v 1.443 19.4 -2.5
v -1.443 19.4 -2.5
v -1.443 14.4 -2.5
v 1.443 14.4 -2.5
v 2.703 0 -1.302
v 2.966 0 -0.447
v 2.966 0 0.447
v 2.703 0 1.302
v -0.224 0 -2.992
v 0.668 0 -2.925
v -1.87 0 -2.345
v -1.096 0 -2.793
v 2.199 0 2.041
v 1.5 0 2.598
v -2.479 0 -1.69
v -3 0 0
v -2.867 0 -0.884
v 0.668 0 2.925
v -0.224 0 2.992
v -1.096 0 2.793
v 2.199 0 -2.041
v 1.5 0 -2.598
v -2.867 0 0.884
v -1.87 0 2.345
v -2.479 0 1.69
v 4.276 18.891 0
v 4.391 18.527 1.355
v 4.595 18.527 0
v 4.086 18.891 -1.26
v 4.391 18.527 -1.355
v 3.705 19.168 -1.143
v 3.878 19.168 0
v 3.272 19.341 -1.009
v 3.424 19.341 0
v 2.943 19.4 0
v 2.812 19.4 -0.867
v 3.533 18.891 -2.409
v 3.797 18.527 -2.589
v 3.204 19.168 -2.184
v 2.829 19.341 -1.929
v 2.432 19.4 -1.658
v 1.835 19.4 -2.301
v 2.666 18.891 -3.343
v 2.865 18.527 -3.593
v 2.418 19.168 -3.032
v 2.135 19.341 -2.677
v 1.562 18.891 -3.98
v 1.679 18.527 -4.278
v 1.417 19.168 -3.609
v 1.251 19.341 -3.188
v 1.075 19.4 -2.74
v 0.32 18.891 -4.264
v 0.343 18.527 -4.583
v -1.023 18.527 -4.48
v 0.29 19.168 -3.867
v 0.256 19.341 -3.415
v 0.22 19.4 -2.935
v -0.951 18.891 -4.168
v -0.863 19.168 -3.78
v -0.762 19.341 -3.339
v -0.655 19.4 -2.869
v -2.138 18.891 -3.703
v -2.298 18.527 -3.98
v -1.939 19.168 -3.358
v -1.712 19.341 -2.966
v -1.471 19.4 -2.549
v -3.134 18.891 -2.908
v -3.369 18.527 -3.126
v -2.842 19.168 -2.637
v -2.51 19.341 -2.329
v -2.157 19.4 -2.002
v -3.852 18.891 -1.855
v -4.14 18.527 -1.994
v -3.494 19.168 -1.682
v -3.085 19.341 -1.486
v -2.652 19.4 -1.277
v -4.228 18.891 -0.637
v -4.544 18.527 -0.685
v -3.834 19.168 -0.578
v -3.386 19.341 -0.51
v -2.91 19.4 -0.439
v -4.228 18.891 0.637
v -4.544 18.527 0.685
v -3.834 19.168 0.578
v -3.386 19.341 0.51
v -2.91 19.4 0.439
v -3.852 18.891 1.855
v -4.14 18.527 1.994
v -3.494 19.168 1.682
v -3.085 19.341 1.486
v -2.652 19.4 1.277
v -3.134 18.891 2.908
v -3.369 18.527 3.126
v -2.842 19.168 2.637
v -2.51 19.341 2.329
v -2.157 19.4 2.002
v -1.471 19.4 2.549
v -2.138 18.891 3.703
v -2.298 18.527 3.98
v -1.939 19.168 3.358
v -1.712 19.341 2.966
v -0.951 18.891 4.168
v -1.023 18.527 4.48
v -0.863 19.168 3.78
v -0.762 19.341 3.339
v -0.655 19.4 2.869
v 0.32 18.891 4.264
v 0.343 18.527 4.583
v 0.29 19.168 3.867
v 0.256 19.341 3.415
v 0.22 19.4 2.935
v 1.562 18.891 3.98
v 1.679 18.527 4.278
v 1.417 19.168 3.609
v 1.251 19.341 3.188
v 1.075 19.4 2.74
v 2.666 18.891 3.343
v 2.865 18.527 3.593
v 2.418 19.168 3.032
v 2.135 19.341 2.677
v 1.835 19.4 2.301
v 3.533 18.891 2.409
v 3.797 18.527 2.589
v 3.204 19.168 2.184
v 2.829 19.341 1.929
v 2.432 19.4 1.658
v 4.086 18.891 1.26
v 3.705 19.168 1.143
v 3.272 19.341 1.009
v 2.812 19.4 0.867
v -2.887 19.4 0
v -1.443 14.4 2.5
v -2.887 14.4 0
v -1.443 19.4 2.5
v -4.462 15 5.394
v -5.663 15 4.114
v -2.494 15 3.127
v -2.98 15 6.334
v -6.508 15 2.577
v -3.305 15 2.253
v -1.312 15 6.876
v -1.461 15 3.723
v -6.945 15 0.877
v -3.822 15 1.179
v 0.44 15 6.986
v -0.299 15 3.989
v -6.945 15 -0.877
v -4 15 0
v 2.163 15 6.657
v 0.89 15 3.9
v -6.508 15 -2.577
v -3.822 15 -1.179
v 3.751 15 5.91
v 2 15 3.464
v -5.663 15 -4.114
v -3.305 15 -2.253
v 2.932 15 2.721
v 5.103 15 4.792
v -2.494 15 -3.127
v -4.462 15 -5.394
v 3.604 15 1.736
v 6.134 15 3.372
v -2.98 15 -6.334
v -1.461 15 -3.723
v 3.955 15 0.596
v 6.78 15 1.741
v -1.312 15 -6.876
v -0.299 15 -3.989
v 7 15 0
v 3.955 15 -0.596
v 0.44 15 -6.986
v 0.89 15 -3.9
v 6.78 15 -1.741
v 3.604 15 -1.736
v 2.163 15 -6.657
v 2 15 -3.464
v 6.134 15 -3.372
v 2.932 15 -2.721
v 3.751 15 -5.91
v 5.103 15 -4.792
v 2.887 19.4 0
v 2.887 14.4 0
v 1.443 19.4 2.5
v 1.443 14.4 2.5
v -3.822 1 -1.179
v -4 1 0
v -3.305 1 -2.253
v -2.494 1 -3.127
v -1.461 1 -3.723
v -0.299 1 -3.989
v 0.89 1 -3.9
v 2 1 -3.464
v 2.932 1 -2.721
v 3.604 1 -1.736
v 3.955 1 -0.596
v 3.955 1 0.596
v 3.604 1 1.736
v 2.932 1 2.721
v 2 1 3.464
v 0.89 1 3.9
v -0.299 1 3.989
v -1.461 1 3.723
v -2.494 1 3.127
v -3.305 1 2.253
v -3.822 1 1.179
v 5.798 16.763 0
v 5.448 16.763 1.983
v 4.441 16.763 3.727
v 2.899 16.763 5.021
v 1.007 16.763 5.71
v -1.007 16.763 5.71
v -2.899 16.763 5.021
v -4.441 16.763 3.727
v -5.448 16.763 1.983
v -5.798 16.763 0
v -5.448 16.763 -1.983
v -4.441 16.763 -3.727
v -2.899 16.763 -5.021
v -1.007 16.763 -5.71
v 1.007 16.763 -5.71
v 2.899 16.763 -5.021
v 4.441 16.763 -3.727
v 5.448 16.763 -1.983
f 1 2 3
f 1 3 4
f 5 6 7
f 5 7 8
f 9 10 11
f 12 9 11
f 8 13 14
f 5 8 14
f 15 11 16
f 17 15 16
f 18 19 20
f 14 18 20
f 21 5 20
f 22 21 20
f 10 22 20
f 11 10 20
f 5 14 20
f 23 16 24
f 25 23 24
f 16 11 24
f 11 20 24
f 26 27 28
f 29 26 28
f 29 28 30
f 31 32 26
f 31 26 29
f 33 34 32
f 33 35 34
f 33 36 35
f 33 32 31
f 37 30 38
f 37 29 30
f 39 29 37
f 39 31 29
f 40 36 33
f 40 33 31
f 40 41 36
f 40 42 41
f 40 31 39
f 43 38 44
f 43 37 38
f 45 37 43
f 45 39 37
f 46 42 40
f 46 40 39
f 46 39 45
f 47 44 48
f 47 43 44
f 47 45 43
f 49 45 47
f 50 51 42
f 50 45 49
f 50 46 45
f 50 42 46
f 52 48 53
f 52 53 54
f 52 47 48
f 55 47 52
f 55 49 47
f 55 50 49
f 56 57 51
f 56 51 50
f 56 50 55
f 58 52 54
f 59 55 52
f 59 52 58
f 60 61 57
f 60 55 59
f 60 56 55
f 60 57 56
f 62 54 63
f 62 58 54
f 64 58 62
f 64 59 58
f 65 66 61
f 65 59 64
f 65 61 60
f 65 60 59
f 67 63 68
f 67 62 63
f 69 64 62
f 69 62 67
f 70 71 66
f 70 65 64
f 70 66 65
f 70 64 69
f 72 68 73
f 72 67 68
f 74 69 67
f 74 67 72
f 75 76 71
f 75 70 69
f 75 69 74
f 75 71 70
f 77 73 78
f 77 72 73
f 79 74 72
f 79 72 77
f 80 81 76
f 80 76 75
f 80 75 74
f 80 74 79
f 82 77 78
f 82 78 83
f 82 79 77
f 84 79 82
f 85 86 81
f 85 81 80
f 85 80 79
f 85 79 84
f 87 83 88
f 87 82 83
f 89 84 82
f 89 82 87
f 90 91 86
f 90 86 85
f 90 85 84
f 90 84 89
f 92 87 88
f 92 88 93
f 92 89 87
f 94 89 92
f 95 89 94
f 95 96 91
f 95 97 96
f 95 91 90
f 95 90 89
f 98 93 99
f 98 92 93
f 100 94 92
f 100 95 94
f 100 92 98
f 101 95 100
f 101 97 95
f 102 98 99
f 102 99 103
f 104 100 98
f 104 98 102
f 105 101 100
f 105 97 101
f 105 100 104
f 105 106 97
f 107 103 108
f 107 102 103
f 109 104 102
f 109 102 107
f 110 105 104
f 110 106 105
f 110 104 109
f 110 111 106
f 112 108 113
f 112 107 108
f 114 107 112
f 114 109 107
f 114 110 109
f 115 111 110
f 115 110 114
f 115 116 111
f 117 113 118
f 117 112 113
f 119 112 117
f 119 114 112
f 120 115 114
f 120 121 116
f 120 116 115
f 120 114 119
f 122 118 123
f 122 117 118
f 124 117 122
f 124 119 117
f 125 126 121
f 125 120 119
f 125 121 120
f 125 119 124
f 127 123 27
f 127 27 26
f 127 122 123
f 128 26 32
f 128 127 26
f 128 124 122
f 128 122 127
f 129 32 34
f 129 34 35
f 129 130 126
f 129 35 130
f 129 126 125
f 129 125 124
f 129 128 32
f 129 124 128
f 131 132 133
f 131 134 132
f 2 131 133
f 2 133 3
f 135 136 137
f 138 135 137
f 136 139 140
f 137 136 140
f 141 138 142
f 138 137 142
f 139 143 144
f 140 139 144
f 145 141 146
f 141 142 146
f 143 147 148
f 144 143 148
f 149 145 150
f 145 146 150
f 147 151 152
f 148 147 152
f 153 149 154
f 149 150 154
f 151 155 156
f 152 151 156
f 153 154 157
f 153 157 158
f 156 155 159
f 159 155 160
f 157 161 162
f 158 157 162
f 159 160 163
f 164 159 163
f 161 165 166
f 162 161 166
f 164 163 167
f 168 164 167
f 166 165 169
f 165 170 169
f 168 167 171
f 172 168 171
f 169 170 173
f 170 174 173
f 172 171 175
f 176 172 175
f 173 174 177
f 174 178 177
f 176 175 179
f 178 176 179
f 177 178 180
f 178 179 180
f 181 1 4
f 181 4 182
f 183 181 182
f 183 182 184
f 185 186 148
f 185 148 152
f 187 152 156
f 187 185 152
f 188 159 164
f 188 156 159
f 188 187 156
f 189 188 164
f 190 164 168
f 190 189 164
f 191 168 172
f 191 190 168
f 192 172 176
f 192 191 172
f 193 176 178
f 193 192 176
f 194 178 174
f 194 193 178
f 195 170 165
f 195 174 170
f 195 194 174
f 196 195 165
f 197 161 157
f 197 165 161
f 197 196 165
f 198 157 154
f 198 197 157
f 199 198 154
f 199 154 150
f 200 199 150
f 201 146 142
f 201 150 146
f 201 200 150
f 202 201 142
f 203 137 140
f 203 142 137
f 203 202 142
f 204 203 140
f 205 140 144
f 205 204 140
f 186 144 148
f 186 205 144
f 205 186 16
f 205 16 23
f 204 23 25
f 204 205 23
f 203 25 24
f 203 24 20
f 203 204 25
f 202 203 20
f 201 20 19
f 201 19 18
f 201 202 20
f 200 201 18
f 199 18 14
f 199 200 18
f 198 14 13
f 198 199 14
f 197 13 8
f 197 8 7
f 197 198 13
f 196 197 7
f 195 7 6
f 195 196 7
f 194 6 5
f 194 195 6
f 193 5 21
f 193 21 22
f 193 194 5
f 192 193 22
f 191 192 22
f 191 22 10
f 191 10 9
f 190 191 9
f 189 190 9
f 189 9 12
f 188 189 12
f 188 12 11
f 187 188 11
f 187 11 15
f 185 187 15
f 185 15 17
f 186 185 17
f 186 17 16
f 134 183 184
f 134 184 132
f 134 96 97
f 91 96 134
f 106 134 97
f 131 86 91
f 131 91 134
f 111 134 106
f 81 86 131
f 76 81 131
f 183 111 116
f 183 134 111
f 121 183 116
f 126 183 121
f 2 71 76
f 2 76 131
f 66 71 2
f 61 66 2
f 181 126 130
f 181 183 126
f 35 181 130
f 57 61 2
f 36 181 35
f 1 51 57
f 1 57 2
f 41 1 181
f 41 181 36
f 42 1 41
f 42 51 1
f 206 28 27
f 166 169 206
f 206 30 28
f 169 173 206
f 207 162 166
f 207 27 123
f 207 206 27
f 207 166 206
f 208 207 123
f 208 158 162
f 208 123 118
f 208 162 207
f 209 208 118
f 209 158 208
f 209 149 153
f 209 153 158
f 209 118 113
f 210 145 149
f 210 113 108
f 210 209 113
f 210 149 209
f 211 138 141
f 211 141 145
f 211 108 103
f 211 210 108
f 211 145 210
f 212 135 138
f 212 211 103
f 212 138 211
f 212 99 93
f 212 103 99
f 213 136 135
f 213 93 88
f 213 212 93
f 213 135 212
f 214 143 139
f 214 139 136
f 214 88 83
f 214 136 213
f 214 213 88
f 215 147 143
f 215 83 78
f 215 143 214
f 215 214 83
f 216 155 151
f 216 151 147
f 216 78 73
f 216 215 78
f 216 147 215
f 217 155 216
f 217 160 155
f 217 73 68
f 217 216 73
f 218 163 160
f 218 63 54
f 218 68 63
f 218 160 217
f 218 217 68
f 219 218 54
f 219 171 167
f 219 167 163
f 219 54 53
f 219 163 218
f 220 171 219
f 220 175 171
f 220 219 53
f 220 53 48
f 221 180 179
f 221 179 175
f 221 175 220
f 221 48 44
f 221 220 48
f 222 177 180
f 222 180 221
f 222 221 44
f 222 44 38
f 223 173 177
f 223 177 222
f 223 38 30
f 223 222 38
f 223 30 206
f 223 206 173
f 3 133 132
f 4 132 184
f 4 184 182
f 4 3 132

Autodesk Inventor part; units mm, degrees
ref_plane "YZ Plane" through (0, 0, 0) normal (1, 0, 0) x (0, 1, 0)
ref_plane "XZ Plane" through (0, 0, 0) normal (0, 1, 0) x (-1, 0, 0)
sketch "Sketch1" plane through (0, 0, 0) normal (0, 1, 0) x (-1, 0, 0)
  circle A0 centre (0, 0) radius 4
  dimension "d0" = 8
extrude "Extrusion1" add sketch "Sketch1" along normal blind 15
chamfer "Chamfer1" distance 1 angle 45 1 edges at (4, 0, 0)
ref_plane "Work Plane1" through (0, 19.4, 0) normal (0, 1, 0) x (1, 0, 0)
thread "Thread1" size "M8x1.25" class "6g" standard "ANSI Metric M Profile" full length
sketch "Sketch5" plane through (0, 15, 0) normal (0, 1, 0) x (1, 0, 0)
  circle A0 centre (0, 0) radius 7
  dimension "d17" = 14
sketch "Sketch6" plane through (0, 19.4, 0) normal (0, 1, 0) x (1, 0, 0)
  circle A0 centre (0, 0) radius 4
  dimension "d18" = 8
loft "Loft2" add profiles "Sketch5", "Sketch6"
fillet "Fillet1" radius 2 1 edges at (-4, 19.4, 0)
sketch "Sketch7" plane through (0, 19.4, 0) normal (0, 1, 0) x (1, 0, 0)
  line L0 (2.8868, 0) -> (1.4434, -2.5)
  line L1 (1.4434, -2.5) -> (-1.4434, -2.5)
  line L2 (-1.4434, -2.5) -> (-2.8868, 0)
  line L3 (-2.8868, 0) -> (-1.4434, 2.5)
  line L4 (-1.4434, 2.5) -> (1.4434, 2.5)
  line L5 (1.4434, 2.5) -> (2.8868, 0)
  point P0 (0, 0)
  point P1 (0, 0)
  dimension "d24" = 5
extrude "Extrusion3" cut sketch "Sketch7" against normal blind 5
properties part number "M8x15"
